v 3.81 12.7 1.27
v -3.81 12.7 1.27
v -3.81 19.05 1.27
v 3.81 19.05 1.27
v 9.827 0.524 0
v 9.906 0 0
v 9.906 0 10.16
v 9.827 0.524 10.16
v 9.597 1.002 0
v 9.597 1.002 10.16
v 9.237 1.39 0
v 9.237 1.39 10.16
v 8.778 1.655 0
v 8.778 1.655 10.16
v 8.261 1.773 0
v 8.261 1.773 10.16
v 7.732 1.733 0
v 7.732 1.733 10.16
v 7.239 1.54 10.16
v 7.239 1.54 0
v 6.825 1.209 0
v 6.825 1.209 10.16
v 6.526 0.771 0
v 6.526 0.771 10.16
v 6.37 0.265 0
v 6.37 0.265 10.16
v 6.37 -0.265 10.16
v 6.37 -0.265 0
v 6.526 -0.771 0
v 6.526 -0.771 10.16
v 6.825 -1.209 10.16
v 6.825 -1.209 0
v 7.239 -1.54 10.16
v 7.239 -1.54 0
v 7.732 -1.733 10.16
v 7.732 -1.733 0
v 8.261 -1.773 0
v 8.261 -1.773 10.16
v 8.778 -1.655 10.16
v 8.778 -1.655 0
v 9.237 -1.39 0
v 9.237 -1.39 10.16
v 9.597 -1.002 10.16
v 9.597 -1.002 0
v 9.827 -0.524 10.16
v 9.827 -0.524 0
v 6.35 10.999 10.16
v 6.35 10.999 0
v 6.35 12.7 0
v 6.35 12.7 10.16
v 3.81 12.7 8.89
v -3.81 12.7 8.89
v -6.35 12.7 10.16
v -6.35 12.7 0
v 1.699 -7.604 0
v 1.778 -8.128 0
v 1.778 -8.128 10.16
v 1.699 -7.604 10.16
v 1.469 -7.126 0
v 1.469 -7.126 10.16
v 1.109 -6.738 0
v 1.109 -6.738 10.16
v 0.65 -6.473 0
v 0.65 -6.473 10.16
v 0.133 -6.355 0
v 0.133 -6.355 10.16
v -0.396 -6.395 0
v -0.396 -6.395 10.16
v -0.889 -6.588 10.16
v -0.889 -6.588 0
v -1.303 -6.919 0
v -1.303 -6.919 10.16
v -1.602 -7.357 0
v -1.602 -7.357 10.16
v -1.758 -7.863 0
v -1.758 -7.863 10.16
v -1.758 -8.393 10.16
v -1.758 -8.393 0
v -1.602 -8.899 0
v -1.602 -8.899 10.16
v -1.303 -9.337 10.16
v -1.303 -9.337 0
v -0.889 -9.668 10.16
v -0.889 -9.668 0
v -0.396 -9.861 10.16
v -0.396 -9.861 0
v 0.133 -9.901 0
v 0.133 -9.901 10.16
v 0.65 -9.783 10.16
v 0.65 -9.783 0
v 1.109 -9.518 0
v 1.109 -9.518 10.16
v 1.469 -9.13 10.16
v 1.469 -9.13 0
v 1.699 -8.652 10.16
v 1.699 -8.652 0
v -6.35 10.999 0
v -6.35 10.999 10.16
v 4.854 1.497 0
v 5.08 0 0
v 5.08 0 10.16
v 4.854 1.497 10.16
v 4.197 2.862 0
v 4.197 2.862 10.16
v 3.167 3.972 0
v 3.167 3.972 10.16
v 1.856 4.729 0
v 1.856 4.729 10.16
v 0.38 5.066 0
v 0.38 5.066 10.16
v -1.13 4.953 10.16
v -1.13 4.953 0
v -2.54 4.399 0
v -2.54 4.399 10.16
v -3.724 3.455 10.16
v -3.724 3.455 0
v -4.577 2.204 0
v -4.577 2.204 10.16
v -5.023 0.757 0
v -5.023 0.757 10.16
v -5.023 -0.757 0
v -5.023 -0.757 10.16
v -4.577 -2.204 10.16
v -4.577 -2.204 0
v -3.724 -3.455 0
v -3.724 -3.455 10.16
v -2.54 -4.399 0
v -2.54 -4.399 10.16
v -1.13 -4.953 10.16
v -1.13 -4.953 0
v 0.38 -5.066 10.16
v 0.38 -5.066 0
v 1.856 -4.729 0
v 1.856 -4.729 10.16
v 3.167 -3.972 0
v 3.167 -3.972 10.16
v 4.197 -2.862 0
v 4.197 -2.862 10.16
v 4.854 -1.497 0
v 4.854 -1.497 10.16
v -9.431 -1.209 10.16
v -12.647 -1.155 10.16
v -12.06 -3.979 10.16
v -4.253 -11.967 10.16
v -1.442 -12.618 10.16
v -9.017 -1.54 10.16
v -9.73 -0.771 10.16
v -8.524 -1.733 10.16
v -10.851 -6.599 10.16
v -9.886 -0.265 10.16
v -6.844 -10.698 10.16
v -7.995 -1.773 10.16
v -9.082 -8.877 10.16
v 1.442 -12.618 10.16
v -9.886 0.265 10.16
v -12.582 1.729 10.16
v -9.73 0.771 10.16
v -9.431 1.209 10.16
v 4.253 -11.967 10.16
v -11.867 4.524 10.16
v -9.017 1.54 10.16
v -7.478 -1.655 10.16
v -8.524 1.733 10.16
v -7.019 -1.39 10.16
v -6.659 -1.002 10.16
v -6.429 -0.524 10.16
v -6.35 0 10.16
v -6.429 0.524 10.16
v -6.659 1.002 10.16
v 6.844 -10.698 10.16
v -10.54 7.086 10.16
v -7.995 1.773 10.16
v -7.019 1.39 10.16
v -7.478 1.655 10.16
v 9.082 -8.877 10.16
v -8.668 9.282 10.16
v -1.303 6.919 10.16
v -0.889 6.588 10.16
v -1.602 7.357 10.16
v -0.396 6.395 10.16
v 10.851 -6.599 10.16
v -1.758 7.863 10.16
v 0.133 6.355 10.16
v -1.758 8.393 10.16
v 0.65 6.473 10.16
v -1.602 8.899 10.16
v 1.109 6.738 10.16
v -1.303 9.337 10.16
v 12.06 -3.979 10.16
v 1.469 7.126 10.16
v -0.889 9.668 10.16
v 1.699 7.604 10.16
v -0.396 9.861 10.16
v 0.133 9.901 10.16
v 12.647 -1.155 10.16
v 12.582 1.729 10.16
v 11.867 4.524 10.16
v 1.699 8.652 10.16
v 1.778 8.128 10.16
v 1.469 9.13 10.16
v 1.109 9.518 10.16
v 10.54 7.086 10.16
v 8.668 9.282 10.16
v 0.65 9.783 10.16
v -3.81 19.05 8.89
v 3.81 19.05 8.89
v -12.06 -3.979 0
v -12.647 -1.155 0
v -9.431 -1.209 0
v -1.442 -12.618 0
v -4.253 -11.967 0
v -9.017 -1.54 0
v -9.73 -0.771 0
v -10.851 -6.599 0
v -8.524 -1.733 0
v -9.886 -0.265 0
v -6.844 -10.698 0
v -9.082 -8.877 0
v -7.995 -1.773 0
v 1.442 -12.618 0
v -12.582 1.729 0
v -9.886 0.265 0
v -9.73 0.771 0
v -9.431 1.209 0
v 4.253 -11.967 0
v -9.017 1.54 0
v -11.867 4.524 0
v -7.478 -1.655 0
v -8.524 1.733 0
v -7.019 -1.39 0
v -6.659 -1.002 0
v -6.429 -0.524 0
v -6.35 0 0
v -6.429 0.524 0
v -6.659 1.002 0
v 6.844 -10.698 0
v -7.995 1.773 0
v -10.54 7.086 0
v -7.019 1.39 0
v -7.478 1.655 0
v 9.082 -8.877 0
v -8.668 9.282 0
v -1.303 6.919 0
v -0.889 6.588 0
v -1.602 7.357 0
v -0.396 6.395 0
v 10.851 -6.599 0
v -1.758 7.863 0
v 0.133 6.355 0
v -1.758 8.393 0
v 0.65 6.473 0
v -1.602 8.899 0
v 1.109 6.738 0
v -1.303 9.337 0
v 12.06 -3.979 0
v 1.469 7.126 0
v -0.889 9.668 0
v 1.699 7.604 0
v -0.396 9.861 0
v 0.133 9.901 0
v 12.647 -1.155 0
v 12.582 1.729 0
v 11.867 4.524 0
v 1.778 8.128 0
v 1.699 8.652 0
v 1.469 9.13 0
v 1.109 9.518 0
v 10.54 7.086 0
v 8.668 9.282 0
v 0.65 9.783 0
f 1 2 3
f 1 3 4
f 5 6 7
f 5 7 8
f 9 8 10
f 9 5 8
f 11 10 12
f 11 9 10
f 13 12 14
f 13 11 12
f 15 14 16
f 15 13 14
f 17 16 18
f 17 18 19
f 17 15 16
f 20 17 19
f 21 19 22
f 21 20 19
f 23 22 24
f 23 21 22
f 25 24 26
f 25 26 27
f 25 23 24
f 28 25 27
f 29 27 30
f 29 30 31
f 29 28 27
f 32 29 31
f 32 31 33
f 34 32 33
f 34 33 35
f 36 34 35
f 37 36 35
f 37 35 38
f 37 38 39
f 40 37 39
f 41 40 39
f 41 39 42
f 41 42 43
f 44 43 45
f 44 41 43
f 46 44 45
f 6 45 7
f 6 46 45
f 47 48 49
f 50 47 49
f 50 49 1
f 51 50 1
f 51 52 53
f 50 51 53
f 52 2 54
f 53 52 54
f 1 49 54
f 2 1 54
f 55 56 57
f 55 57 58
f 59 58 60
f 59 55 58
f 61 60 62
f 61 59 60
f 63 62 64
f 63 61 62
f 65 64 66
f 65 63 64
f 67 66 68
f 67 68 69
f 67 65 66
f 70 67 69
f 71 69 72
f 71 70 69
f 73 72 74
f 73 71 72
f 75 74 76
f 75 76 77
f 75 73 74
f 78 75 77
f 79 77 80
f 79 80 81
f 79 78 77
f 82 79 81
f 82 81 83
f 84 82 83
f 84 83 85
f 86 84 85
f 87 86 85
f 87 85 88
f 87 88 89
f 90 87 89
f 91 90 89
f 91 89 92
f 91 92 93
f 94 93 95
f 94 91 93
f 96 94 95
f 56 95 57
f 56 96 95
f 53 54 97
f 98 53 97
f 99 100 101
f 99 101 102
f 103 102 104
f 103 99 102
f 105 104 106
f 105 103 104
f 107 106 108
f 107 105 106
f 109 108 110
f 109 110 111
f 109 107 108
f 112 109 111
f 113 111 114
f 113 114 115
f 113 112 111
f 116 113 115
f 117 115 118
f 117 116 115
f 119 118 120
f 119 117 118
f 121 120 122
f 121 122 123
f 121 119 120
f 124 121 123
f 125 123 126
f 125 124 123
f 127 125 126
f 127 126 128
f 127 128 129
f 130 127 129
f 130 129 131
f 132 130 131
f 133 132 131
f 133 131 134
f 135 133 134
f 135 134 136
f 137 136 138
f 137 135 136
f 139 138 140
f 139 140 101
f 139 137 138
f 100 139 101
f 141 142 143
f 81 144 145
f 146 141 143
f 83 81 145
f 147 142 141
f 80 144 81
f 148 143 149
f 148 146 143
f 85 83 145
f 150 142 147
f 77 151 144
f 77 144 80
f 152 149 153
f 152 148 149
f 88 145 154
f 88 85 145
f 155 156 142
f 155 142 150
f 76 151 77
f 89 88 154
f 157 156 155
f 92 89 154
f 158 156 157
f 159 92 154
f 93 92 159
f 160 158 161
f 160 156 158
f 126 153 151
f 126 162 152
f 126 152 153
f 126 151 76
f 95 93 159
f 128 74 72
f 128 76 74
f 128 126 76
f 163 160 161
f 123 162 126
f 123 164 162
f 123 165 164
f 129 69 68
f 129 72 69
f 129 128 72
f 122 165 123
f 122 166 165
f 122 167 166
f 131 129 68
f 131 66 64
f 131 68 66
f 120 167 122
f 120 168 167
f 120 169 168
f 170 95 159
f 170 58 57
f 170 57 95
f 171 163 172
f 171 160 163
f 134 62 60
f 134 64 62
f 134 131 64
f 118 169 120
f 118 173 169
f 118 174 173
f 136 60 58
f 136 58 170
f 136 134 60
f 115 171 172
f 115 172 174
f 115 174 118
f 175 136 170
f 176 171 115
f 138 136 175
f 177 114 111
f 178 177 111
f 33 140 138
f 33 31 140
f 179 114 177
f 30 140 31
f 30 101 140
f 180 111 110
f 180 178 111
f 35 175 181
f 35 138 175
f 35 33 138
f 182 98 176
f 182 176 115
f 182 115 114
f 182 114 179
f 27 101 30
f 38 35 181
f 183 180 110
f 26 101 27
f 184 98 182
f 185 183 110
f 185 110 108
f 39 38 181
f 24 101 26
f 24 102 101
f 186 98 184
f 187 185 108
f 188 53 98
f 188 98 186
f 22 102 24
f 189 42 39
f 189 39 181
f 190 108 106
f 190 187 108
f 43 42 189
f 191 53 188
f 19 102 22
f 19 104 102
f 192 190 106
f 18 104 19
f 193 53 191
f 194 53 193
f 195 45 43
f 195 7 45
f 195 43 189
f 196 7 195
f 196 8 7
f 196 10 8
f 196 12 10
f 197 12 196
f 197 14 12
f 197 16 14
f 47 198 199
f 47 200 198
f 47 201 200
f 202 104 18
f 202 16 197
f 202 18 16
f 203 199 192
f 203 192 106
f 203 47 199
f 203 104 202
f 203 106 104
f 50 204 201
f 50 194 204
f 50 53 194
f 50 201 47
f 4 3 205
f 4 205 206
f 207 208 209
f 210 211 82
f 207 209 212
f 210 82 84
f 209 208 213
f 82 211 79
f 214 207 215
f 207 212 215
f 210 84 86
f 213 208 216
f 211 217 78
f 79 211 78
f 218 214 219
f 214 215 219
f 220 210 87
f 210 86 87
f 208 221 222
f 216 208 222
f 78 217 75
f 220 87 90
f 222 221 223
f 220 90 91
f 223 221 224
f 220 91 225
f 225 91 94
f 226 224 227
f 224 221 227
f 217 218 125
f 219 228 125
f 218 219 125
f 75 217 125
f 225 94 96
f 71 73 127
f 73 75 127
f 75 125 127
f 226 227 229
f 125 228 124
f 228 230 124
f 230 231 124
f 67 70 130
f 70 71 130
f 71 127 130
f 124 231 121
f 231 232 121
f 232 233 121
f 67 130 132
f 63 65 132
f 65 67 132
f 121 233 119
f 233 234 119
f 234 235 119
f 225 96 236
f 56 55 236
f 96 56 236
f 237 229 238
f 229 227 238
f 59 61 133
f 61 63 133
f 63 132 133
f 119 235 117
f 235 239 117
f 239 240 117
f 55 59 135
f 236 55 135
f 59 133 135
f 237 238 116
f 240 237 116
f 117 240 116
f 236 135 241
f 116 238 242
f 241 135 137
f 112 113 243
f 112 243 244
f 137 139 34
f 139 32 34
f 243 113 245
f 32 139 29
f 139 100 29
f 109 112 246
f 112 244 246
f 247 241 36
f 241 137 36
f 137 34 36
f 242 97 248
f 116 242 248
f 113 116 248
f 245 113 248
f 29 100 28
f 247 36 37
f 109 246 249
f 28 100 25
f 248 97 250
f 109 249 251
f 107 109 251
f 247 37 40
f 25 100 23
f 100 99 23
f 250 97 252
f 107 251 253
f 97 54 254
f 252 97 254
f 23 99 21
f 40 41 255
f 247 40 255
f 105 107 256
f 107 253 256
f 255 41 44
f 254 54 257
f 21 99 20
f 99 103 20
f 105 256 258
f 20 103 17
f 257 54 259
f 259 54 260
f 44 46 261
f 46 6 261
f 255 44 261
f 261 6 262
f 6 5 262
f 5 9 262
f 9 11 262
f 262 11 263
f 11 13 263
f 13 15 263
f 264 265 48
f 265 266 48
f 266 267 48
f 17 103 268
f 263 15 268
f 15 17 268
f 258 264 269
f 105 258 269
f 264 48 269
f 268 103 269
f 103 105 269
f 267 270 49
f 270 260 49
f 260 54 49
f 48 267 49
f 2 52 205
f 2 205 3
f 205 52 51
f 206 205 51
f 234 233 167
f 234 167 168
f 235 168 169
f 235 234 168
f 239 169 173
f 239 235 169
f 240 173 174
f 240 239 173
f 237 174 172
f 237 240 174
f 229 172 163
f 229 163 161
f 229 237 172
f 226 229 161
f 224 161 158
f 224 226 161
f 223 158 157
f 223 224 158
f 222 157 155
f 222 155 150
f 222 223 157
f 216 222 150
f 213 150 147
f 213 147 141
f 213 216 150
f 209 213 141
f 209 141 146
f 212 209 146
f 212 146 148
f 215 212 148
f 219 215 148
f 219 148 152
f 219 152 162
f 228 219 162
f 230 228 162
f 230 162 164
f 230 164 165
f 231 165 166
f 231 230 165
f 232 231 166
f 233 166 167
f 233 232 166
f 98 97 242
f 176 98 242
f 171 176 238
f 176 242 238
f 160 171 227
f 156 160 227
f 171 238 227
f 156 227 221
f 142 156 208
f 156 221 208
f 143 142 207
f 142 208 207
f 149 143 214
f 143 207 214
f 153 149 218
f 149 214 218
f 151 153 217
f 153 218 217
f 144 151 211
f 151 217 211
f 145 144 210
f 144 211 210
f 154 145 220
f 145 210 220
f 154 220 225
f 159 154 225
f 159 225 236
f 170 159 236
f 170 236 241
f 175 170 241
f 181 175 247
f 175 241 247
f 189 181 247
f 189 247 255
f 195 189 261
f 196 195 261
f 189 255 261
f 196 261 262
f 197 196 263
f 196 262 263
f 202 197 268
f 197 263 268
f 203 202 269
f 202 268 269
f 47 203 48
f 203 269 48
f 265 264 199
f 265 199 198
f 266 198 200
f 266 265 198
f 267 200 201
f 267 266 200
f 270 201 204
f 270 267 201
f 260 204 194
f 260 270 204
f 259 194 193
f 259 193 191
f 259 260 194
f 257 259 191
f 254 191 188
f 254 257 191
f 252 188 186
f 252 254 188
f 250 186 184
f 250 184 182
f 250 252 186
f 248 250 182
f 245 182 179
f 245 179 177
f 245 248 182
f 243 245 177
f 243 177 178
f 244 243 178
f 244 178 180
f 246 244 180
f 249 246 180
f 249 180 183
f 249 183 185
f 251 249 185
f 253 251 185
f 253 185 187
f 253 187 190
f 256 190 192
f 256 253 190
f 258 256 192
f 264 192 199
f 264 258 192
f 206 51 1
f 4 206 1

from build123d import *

# Parameters (mm, degrees)
SKETCH1_R           = 5.08
SKETCH1_R_2         = 1.778
BOSS_EXTRUDE1_DEPTH = 10.16
SKETCH2_W           = 7.62
SKETCH2_H           = 7.62
BOSS_EXTRUDE2_DEPTH = 6.35


with BuildPart() as part:
    # Sketch1 → Boss-Extrude1 (new body)
    with BuildSketch(Plane.XY):
        with BuildLine():
            Line((-6.35, 12.7), (-6.35, 10.998522628))
            ThreePointArc((-6.35, 10.998522628), (0, -12.7), (6.35, 10.998522628))
            Line((6.35, 10.998522628), (6.35, 12.7))
            Line((6.35, 12.7), (-6.35, 12.7))
        make_face()
        Circle(SKETCH1_R, mode=Mode.SUBTRACT)
        with Locations((0, 8.128)):
            Circle(SKETCH1_R_2, mode=Mode.SUBTRACT)
        with Locations((8.128, 0)):
            Circle(SKETCH1_R_2, mode=Mode.SUBTRACT)
        with Locations((0, -8.128)):
            Circle(SKETCH1_R_2, mode=Mode.SUBTRACT)
        with Locations((-8.128, 0)):
            Circle(SKETCH1_R_2, mode=Mode.SUBTRACT)
    extrude(amount=BOSS_EXTRUDE1_DEPTH)

    # Sketch2 → Boss-Extrude2 (add)
    with BuildSketch(Plane(origin=(0, 12.7, 0), x_dir=(1, 0, 0), z_dir=(0, 1, 0))):
        with Locations((0, -5.08)):
            Rectangle(SKETCH2_W, SKETCH2_H)
    extrude(amount=BOSS_EXTRUDE2_DEPTH)


solid = part.part
